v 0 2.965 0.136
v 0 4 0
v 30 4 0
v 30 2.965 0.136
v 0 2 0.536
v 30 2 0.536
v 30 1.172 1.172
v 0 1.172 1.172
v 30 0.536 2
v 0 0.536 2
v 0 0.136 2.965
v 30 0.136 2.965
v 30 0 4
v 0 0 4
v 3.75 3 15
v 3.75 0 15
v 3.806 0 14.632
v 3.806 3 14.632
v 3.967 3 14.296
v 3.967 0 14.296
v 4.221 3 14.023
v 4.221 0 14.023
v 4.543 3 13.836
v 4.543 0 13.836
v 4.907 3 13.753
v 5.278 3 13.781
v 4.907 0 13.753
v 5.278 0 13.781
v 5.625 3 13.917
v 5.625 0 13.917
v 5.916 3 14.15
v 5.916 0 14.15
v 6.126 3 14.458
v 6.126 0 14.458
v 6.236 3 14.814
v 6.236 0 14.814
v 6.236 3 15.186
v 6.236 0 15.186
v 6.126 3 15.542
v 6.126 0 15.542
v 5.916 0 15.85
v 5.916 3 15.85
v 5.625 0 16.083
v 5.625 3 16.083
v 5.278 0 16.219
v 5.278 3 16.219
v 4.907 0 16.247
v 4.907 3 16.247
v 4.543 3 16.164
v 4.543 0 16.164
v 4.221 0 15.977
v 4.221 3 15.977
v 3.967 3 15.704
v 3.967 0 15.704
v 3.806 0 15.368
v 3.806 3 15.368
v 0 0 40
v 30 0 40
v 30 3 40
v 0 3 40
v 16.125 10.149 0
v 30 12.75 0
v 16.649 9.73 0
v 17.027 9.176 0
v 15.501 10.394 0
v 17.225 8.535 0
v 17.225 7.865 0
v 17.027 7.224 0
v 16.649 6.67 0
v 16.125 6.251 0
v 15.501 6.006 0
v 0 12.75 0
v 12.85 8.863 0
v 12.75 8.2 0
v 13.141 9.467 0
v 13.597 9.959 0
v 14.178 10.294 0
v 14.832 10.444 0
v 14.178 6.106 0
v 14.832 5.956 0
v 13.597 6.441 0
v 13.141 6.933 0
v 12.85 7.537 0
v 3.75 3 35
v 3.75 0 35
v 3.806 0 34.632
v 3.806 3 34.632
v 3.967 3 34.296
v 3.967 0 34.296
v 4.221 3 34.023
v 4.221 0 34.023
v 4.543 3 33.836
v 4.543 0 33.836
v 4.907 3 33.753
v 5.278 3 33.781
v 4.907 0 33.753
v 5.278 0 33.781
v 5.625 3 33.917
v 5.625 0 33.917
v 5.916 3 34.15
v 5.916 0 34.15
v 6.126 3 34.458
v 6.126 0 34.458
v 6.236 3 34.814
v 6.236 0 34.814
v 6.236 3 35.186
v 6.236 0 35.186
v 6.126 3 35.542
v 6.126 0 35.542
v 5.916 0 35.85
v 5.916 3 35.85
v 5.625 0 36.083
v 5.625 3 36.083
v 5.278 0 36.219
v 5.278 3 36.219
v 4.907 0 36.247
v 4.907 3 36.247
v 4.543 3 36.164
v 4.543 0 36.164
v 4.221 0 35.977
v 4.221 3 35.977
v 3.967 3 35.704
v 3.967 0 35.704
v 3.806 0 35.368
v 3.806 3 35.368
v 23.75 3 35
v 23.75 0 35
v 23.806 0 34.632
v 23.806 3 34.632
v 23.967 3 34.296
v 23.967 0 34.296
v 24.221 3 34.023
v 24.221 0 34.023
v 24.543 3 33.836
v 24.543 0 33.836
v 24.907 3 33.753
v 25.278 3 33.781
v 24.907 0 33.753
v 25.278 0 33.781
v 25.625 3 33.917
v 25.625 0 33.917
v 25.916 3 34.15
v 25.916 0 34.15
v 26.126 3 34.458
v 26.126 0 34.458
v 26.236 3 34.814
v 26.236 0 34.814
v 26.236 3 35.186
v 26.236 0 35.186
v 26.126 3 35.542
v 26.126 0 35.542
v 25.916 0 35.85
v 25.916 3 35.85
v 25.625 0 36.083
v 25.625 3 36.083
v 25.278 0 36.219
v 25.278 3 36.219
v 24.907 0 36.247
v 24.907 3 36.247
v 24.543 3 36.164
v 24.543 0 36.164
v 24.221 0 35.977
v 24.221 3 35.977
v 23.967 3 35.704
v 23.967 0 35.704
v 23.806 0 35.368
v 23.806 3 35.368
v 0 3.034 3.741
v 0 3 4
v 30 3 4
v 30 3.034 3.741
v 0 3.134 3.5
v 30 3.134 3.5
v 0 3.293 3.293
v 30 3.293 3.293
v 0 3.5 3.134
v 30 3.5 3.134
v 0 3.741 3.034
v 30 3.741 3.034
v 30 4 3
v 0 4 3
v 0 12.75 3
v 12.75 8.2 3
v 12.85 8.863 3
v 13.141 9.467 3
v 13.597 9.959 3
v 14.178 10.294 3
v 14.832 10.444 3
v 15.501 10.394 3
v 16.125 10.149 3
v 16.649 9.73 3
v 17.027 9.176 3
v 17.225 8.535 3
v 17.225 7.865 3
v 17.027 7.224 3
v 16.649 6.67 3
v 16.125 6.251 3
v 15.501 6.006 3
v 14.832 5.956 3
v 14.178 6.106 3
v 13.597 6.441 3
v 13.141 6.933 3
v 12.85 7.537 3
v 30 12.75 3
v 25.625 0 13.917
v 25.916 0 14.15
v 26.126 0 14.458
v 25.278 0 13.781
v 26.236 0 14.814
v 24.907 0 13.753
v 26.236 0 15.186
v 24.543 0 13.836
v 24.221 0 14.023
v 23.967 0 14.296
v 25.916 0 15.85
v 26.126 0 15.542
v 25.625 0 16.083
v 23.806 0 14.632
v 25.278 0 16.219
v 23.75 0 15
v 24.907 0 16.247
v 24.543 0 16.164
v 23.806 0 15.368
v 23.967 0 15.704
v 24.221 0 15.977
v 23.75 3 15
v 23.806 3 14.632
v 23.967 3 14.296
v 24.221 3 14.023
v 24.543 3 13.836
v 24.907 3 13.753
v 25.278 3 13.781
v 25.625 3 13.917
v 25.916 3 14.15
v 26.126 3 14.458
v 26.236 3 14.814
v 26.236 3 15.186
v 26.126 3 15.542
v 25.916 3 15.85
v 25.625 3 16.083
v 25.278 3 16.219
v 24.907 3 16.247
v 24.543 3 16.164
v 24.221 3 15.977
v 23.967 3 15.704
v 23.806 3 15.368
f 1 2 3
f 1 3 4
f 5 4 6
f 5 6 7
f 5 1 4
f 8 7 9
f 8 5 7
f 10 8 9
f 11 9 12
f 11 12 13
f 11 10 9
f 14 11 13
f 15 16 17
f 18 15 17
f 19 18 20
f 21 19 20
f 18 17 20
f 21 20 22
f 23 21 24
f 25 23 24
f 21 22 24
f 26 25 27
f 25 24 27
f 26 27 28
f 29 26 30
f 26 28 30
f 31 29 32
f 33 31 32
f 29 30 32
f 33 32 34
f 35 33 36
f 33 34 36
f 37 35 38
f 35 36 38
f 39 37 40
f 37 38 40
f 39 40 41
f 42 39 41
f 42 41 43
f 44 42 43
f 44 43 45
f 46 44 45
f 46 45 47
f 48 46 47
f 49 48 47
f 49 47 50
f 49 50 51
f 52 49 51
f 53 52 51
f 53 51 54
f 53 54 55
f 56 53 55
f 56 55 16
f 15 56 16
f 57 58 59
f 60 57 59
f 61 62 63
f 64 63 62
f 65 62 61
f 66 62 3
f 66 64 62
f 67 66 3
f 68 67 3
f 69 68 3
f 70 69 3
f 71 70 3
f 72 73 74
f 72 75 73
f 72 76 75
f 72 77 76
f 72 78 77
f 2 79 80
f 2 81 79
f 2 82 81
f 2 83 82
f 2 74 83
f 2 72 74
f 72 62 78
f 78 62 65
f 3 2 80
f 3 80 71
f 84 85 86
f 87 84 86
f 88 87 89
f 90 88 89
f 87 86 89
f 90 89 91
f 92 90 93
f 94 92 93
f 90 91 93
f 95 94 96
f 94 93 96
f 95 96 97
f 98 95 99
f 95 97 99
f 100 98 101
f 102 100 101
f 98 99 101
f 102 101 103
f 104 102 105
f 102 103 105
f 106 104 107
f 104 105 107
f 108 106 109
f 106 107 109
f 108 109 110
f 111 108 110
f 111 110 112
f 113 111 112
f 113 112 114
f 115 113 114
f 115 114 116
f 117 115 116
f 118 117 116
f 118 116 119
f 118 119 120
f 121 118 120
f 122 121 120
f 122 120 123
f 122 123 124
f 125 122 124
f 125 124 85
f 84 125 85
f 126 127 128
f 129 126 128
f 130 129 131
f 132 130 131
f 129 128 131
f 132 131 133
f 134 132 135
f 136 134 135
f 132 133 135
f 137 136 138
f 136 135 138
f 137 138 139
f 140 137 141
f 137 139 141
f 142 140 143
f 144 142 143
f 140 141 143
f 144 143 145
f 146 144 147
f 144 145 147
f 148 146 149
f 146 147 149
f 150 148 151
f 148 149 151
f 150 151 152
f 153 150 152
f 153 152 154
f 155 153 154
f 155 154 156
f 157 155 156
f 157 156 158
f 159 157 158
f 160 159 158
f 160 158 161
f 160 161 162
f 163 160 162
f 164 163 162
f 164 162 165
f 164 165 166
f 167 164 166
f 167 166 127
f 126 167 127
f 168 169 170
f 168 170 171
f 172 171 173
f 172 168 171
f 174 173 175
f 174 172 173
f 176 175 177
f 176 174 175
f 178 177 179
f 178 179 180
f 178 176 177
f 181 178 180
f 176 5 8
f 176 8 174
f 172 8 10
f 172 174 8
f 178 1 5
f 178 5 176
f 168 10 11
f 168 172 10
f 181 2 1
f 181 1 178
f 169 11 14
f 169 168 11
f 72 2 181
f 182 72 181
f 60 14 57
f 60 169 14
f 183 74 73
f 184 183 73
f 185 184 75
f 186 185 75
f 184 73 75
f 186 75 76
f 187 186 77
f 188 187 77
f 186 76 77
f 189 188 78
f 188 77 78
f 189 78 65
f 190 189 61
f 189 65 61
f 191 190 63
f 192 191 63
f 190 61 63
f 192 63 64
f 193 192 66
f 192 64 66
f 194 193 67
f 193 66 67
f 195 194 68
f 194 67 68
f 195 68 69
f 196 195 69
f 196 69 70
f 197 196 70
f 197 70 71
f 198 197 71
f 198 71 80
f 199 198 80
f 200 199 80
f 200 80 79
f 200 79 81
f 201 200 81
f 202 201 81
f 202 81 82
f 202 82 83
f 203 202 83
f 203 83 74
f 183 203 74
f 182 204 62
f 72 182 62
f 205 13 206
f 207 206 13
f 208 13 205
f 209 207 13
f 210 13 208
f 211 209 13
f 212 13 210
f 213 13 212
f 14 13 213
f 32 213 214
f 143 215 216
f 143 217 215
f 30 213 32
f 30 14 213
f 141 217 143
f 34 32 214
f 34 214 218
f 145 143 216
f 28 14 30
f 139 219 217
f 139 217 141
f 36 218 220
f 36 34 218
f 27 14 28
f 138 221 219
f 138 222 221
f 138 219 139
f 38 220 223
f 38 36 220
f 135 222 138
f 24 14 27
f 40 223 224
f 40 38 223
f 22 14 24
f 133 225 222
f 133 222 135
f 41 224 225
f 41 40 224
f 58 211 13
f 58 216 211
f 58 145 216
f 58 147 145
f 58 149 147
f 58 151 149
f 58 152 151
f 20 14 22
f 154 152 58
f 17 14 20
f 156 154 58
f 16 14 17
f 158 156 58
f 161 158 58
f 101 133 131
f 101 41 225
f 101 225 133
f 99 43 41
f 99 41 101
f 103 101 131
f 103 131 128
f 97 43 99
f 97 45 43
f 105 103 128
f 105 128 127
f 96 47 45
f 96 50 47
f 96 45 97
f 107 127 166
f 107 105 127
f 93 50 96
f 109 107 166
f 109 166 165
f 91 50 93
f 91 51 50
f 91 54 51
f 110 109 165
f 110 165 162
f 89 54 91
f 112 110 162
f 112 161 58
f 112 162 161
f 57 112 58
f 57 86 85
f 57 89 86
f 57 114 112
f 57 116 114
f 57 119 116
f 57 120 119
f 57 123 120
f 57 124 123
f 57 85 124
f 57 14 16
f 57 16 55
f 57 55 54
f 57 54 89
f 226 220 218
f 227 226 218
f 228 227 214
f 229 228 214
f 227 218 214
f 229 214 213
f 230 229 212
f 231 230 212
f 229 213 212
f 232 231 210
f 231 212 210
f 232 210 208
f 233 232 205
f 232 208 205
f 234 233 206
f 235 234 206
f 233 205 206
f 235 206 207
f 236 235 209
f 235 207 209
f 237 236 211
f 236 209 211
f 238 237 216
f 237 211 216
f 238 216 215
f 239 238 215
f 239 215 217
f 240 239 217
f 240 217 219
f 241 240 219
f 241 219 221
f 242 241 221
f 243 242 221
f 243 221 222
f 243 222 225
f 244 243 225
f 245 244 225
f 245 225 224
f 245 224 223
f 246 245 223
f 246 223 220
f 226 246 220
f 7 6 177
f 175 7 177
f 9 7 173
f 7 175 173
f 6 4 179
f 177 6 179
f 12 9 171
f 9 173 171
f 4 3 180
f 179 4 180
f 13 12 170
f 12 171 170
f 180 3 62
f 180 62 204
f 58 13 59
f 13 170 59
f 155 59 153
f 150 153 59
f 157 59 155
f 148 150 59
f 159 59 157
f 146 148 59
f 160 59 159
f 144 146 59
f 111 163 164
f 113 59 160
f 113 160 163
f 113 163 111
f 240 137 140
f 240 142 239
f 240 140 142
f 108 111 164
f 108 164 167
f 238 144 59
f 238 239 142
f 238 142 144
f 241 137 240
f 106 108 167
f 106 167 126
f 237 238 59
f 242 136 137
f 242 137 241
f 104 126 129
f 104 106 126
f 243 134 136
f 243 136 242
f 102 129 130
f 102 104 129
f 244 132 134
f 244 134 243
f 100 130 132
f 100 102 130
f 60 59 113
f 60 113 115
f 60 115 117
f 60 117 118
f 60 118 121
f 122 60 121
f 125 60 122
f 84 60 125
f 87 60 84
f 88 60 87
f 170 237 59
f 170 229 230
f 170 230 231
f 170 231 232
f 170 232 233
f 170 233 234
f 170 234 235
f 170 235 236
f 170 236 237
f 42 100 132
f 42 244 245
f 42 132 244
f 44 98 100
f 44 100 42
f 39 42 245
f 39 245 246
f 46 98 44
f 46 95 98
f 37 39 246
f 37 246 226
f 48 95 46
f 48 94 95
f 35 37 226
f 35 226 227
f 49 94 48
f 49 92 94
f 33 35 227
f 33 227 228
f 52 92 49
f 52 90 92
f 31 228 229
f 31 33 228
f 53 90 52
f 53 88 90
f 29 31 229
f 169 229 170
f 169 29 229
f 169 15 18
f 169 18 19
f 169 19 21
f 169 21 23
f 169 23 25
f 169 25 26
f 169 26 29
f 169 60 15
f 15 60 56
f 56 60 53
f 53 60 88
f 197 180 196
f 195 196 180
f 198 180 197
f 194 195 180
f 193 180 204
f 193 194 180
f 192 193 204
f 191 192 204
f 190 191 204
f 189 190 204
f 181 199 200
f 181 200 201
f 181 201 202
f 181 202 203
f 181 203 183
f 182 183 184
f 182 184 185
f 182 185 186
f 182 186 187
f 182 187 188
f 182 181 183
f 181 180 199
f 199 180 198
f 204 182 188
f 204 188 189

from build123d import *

# Parameters (mm, degrees)
T_LE_DE_BASE_PLI_E1_DEPTH = 30
TROU_TARAUD_M31_D         = 2.5
D_GAGEMENT_M41_D          = 4.5


# Sheet-metal steps are written as plain solids
with BuildPart() as part:
    # Esquisse1 → Tôle de base pliée1 (new body)
    with BuildSketch(Plane(origin=(0, 0, 0), x_dir=(0, 0, -1), z_dir=(1, 0, 0))):
        with BuildLine():
            Line((0, 12.75), (0, 4))
            ThreePointArc((0, 4), (-1.171572875, 1.171572875), (-4, 0))
            Line((-4, 0), (-40, 0))
            Line((-40, 0), (-40, 3))
            Line((-40, 3), (-4, 3))
            ThreePointArc((-4, 3), (-3.292893219, 3.292893219), (-3, 4))
            Line((-3, 4), (-3, 12.75))
            Line((-3, 12.75), (0, 12.75))
        make_face()
    extrude(amount=T_LE_DE_BASE_PLI_E1_DEPTH)

    # Trou taraudé M31 (through all)
    with Locations(Plane(origin=(0, 3, 0), x_dir=(1, 0, 0), z_dir=(0, 1, 0))):
        with Locations((5, -35), (5, -15), (25, -15), (25, -35)):
            Hole(TROU_TARAUD_M31_D / 2)

    # Dégagement M41 (through all)
    with Locations(Plane.XY.offset(3)):
        with Locations((15, 8.2)):
            Hole(D_GAGEMENT_M41_D / 2)


solid = part.part
